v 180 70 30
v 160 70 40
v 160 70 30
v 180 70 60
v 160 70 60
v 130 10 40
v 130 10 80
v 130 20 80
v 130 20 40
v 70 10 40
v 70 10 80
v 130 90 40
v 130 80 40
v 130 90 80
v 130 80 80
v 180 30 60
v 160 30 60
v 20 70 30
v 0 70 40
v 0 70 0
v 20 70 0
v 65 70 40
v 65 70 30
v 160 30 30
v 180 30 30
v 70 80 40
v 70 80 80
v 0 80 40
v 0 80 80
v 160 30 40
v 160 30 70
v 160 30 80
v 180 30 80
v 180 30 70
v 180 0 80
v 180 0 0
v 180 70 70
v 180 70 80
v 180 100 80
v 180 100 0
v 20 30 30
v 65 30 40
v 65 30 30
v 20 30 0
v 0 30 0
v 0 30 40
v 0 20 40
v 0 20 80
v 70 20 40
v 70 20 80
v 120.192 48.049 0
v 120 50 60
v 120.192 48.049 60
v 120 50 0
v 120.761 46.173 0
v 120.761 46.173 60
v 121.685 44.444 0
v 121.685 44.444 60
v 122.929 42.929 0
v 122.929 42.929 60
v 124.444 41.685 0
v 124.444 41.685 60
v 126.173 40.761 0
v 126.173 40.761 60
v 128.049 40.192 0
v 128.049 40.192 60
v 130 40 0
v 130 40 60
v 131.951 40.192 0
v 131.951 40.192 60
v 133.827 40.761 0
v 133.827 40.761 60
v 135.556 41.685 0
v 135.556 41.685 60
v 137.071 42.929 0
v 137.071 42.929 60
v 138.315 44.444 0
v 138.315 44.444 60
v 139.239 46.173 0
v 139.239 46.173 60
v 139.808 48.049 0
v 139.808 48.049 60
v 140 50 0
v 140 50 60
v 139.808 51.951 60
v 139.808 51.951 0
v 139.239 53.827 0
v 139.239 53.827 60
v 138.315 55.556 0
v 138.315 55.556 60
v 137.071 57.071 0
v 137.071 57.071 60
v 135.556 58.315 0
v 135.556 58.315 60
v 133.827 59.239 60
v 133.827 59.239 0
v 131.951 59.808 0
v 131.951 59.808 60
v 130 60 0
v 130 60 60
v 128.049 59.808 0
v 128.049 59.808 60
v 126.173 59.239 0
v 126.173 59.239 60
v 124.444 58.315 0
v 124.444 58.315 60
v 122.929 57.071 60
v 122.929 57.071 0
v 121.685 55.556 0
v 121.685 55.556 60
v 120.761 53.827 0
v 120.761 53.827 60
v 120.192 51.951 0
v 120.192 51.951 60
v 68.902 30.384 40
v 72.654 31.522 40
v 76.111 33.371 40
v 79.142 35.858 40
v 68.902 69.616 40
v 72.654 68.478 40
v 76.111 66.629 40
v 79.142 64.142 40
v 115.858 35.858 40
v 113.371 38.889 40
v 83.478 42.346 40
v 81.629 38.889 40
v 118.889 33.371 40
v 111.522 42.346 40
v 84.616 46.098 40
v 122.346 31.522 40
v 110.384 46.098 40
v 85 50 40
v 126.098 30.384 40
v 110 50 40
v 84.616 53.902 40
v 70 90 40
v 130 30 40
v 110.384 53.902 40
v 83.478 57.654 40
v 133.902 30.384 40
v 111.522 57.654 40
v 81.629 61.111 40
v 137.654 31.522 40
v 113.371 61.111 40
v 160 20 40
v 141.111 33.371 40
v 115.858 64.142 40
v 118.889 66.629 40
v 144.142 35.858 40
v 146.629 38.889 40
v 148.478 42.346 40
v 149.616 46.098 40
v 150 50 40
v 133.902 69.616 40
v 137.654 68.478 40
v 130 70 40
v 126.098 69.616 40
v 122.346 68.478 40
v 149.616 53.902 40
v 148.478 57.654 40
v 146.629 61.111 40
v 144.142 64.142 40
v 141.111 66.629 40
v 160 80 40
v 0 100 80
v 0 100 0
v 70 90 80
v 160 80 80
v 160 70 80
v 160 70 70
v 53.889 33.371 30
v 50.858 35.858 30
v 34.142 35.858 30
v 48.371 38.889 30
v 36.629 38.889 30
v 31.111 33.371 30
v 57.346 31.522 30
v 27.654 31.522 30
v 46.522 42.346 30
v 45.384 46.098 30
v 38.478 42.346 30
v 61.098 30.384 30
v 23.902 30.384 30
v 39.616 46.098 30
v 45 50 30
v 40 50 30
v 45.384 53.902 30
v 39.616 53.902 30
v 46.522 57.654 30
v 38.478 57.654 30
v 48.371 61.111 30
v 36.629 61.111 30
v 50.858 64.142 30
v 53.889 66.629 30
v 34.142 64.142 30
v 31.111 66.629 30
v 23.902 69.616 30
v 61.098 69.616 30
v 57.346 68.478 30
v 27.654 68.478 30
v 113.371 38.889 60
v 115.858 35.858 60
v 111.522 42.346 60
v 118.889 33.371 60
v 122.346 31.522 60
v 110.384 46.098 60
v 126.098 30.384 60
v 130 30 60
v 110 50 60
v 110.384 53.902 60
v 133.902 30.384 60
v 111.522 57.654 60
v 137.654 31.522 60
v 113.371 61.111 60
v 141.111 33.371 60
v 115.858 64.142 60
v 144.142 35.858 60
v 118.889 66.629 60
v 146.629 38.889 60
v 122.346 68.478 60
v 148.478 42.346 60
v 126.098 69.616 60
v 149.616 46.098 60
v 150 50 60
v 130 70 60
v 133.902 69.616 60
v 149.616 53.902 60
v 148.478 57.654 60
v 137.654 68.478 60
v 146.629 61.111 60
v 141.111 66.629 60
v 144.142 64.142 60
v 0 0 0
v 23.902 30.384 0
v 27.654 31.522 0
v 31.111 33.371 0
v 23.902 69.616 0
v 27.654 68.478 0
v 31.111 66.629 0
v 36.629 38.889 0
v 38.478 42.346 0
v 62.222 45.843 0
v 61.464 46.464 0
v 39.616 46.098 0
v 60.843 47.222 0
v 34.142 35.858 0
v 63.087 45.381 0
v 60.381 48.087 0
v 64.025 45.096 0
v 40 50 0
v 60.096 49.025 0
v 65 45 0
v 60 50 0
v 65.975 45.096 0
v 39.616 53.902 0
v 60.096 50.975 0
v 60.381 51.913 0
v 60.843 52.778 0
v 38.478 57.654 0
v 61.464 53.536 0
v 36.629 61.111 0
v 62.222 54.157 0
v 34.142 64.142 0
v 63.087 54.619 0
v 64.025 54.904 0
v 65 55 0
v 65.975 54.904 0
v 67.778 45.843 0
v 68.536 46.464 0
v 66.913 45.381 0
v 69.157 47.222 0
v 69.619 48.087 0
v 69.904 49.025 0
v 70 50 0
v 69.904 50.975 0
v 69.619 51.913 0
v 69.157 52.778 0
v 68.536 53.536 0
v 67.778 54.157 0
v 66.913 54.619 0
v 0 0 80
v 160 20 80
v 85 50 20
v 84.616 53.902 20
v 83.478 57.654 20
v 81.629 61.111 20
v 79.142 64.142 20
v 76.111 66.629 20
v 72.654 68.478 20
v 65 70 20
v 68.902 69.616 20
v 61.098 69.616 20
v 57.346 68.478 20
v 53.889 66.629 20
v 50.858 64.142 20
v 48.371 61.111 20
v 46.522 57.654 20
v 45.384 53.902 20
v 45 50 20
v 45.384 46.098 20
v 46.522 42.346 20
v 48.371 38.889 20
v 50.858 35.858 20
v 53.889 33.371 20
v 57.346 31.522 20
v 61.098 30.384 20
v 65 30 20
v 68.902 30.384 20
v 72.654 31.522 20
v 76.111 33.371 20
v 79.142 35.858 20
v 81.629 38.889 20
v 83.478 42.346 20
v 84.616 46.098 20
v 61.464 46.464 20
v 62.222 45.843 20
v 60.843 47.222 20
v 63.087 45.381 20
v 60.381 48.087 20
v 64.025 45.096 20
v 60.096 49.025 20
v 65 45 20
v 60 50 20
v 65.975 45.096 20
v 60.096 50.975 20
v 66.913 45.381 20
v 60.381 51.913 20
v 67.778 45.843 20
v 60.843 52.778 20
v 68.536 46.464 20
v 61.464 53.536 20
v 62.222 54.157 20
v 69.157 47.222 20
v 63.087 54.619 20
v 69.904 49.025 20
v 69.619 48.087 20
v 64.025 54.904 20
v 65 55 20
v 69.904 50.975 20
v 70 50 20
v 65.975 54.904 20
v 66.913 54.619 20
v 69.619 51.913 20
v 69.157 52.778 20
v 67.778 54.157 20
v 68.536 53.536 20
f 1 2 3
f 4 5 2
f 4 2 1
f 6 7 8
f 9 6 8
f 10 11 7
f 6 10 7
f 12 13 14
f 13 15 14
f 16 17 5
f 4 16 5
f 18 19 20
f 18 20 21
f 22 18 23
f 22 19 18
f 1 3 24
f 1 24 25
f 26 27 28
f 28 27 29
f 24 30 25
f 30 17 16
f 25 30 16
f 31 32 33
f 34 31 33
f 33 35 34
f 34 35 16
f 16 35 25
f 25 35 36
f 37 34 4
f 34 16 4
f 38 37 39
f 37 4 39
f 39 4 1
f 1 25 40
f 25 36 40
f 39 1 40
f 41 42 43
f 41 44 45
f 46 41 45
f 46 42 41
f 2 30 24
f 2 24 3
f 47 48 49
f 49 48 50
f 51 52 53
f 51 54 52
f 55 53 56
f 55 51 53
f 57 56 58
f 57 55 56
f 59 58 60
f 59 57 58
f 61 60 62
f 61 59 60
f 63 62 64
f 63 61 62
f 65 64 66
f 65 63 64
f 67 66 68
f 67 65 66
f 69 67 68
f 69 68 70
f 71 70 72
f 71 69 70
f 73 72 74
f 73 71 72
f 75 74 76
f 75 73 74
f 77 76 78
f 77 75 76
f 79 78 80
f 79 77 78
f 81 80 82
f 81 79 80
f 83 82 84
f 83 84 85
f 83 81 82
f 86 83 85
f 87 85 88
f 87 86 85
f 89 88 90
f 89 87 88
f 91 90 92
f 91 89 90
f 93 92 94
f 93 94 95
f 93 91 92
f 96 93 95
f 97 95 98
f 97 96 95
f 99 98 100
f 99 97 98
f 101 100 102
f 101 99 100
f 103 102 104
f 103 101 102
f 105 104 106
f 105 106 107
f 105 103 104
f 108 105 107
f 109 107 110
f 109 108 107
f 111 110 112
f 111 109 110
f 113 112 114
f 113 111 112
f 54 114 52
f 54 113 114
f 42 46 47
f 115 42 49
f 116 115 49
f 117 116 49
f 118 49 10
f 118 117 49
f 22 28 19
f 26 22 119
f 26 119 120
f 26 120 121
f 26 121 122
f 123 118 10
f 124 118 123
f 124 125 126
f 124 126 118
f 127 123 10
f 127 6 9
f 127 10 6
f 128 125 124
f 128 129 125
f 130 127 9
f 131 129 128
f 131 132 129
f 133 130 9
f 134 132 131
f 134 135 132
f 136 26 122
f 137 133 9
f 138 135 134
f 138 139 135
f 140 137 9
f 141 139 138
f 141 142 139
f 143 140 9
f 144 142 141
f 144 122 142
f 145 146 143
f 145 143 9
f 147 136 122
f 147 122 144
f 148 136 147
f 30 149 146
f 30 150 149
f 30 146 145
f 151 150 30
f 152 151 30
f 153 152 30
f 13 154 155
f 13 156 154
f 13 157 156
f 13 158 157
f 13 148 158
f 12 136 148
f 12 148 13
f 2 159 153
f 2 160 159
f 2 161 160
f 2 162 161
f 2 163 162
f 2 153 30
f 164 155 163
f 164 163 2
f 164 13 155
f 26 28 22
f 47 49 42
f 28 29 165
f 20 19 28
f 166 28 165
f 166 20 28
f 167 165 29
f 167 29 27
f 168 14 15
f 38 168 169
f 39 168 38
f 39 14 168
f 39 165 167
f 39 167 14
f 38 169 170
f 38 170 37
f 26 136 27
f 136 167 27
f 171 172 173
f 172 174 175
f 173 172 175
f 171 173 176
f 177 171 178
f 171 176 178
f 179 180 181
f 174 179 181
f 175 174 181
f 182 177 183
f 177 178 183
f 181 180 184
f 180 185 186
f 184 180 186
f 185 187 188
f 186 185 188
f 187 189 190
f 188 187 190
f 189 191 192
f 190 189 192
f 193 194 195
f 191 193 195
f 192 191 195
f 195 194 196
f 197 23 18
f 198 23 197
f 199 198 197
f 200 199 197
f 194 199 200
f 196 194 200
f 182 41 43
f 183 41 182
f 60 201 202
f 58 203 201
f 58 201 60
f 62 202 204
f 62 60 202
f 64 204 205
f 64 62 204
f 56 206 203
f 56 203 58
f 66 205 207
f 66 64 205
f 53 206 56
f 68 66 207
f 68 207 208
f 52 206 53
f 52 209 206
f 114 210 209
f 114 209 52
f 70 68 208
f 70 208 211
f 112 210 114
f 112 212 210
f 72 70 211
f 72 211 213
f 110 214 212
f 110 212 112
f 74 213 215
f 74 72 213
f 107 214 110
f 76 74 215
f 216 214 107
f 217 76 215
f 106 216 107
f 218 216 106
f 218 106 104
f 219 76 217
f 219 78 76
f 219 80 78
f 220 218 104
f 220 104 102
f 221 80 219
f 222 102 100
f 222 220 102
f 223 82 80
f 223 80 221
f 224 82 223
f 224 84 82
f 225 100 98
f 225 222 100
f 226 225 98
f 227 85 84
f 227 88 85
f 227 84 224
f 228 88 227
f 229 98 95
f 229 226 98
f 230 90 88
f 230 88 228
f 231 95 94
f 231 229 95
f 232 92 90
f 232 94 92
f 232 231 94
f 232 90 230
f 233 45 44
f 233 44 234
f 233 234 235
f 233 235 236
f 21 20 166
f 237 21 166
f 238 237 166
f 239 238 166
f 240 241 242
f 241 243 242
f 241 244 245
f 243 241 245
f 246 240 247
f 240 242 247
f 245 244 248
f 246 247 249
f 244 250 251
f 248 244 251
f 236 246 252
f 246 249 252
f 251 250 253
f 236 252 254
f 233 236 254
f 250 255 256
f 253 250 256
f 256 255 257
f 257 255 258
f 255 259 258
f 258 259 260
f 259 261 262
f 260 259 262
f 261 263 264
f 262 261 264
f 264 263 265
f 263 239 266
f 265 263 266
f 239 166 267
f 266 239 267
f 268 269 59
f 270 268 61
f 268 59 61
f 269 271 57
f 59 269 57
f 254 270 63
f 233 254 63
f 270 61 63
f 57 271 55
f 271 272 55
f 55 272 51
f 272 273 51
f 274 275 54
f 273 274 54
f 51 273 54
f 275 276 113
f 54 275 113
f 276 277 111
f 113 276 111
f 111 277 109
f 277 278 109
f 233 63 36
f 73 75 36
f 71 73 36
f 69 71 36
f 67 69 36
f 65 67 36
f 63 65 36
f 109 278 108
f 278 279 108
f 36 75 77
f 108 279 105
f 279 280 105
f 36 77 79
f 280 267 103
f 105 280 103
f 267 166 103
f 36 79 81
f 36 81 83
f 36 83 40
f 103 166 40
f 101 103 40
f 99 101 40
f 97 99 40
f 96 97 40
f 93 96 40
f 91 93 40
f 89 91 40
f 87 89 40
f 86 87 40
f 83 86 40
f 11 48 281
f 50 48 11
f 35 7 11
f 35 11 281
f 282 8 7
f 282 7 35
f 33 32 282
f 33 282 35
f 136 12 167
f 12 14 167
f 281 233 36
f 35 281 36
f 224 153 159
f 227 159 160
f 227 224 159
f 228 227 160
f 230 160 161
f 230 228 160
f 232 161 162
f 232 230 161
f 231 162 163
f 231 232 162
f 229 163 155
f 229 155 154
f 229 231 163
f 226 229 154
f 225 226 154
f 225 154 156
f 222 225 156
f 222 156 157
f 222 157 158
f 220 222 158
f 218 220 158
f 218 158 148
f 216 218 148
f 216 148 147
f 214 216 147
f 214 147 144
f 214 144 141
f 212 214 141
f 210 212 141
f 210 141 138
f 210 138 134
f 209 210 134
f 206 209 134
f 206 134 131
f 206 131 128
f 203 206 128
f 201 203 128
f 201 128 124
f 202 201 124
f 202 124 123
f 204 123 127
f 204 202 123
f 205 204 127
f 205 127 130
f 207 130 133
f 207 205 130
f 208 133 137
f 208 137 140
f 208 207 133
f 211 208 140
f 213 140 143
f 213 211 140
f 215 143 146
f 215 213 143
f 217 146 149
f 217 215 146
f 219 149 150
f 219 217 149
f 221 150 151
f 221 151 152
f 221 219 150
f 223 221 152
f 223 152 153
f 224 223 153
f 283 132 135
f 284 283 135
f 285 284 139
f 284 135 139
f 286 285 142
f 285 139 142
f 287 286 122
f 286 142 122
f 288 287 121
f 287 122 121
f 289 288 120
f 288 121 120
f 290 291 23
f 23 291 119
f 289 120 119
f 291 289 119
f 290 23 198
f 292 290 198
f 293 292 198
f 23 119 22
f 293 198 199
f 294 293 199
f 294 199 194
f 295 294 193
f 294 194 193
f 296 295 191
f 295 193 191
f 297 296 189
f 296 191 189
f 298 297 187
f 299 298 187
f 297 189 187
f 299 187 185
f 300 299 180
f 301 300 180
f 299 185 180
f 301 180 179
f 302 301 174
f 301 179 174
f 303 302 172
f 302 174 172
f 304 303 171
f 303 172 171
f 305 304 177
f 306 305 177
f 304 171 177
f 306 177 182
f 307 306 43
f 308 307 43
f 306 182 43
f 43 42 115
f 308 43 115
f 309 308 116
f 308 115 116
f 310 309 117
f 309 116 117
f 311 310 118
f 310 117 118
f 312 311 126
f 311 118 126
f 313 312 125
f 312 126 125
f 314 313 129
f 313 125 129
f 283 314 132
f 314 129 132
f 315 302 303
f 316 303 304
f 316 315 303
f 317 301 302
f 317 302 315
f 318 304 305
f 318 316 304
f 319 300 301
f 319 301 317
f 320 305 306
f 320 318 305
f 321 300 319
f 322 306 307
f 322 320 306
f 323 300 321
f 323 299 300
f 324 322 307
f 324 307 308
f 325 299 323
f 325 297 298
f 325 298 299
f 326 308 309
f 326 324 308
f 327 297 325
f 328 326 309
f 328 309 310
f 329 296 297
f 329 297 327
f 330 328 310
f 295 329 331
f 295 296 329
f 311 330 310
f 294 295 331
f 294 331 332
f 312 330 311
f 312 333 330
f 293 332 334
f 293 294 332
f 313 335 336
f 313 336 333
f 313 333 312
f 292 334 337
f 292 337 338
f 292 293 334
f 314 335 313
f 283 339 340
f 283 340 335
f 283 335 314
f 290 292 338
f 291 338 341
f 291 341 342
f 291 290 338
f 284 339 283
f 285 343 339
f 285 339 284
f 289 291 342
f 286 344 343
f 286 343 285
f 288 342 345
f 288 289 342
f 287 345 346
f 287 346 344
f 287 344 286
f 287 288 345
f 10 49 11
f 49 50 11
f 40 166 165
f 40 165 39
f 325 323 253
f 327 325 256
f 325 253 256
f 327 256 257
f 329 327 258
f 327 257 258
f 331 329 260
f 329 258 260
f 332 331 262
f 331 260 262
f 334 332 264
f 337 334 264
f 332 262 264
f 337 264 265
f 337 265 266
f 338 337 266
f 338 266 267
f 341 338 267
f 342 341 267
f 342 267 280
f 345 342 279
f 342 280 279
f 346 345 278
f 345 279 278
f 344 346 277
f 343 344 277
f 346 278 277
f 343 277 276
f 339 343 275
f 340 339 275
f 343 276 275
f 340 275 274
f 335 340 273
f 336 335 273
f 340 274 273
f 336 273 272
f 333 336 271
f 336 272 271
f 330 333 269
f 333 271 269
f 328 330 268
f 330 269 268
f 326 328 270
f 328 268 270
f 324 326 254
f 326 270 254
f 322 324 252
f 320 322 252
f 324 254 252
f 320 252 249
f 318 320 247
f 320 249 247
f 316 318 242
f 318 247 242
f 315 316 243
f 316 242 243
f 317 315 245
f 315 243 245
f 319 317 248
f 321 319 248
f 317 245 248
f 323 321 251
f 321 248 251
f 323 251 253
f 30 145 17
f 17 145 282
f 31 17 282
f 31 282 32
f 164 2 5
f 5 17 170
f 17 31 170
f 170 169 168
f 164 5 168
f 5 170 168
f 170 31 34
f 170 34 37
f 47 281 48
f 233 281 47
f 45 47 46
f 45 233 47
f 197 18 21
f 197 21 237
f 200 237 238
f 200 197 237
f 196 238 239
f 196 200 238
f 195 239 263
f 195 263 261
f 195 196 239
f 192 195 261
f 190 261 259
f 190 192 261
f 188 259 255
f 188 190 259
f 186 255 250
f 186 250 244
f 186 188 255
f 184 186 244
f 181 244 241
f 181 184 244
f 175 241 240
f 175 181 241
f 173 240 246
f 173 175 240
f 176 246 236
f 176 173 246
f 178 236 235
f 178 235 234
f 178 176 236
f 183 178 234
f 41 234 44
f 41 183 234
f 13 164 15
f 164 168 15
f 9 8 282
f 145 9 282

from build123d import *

# Parameters (mm, degrees)
SKETCH1_W           = 180
SKETCH1_H           = 100
BOSS_EXTRUDE1_DEPTH = 80
CUT_EXTRUDE1_DEPTH  = 80
SKETCH3_R           = 5
CUT_EXTRUDE2_DEPTH  = 20
SKETCH4_R           = 10
CUT_EXTRUDE3_DEPTH  = 60
SKETCH5_R           = 20
CUT_EXTRUDE4_DEPTH  = 60
SKETCH6_R           = 20
CUT_EXTRUDE5_DEPTH  = 50
CUT_EXTRUDE6_DEPTH  = 50
SKETCH8_W           = 10
SKETCH8_H           = 40
CUT_EXTRUDE7_DEPTH  = 207
CUT_EXTRUDE8_DEPTH  = 10
CUT_EXTRUDE9_DEPTH  = 10
SKETCH11_W          = 20
SKETCH11_H          = 40
CUT_EXTRUDE10_DEPTH = 30
SKETCH12_R          = 20
SKETCH12_R_2        = 10
BOSS_EXTRUDE3_DEPTH = 30
SKETCH13_R          = 20
CUT_EXTRUDE11_DEPTH = 30
SKETCH14_W          = 20
SKETCH14_H          = 40
CUT_EXTRUDE12_DEPTH = 10
SKETCH15_W          = 10
SKETCH15_H          = 40
BOSS_EXTRUDE5_DEPTH = 20


with BuildPart() as part:
    # Sketch1 → Boss-Extrude1 (new body)
    with BuildSketch(Plane.XY):
        with Locations((90, 50)):
            Rectangle(SKETCH1_W, SKETCH1_H)
    extrude(amount=BOSS_EXTRUDE1_DEPTH)

    # Sketch2 → Cut-Extrude1 (cut)
    with BuildSketch(Plane.XY.offset(80)):
        with BuildLine():
            Line((0, 70), (20, 70))
            ThreePointArc((20, 70), (40, 50), (20, 30))
            Line((20, 30), (0, 30))
            Line((0, 30), (0, 70))
        make_face()
    extrude(amount=-CUT_EXTRUDE1_DEPTH, mode=Mode.SUBTRACT)

    # Sketch3 → Cut-Extrude2 (cut)
    with BuildSketch(Plane(origin=(0, 0, 0), x_dir=(-1, 0, 0), z_dir=(0, 0, -1))):
        with Locations((-65, 50)):
            Circle(SKETCH3_R)
    extrude(amount=-CUT_EXTRUDE2_DEPTH, mode=Mode.SUBTRACT)

    # Sketch4 → Cut-Extrude3 (cut)
    with BuildSketch(Plane(origin=(0, 0, 0), x_dir=(-1, 0, 0), z_dir=(0, 0, -1))):
        with Locations((-130, 50)):
            Circle(SKETCH4_R)
    extrude(amount=-CUT_EXTRUDE3_DEPTH, mode=Mode.SUBTRACT)

    # Sketch5 → Cut-Extrude4 (cut)
    with BuildSketch(Plane.XY.offset(80)):
        with Locations((65, 50)):
            Circle(SKETCH5_R)
    extrude(amount=-CUT_EXTRUDE4_DEPTH, mode=Mode.SUBTRACT)

    # Sketch6 → Cut-Extrude5 (cut)
    with BuildSketch(Plane.XY.offset(80)):
        with Locations((130, 50)):
            Circle(SKETCH6_R)
    extrude(amount=-CUT_EXTRUDE5_DEPTH, mode=Mode.SUBTRACT)

    # Sketch7 → Cut-Extrude6 (cut)
    with BuildSketch(Plane.XY.offset(80)):
        with BuildLine():
            Line((20, 70), (65, 70))
            ThreePointArc((65, 70), (45, 50), (65, 30))
            Line((65, 30), (20, 30))
            ThreePointArc((20, 30), (40, 50), (20, 70))
        make_face()
    extrude(amount=-CUT_EXTRUDE6_DEPTH, mode=Mode.SUBTRACT)

    # Sketch8 → Cut-Extrude7 (cut)
    with BuildSketch(Plane(origin=(180, 0, 0), x_dir=(0, 0, -1), z_dir=(1, 0, 0))):
        with Locations((-75, 50)):
            Rectangle(SKETCH8_W, SKETCH8_H)
    extrude(amount=-CUT_EXTRUDE7_DEPTH, mode=Mode.SUBTRACT)

    # Sketch9 → Cut-Extrude8 (cut)
    with BuildSketch(Plane.XY.offset(80)):
        Polygon((0, 70), (160, 70), (160, 80), (130, 80), (130, 90), (70, 90), (70, 80), (0, 80), align=None)
    extrude(amount=-CUT_EXTRUDE8_DEPTH, mode=Mode.SUBTRACT)

    # Sketch10 → Cut-Extrude9 (cut)
    with BuildSketch(Plane.XY.offset(80)):
        Polygon((160, 20), (160, 30), (0, 30), (0, 20), (70, 20), (70, 10), (130, 10), (130, 20), align=None)
    extrude(amount=-CUT_EXTRUDE9_DEPTH, mode=Mode.SUBTRACT)

    # Sketch11 → Cut-Extrude10 (cut)
    with BuildSketch(Plane.XY.offset(70)):
        with Locations((170, 50)):
            Rectangle(SKETCH11_W, SKETCH11_H)
    extrude(amount=-CUT_EXTRUDE10_DEPTH, mode=Mode.SUBTRACT)

    # Sketch12 → Boss-Extrude3 (add)
    with BuildSketch(Plane.XY.offset(30)):
        with Locations((130, 50)):
            Circle(SKETCH12_R)
        with Locations(Location((130, 50, 0), (0, 0, 180))):
            Circle(SKETCH12_R_2, mode=Mode.SUBTRACT)
    extrude(amount=BOSS_EXTRUDE3_DEPTH)

    # Sketch13 → Cut-Extrude11 (cut)
    with BuildSketch(Plane.XY.offset(70)):
        with BuildLine():
            Line((130, 20), (160, 20))
            Line((160, 20), (160, 30))
            Line((160, 30), (160, 70))
            Line((160, 70), (160, 80))
            Line((160, 80), (130, 80))
            Line((130, 80), (130, 90))
            Line((130, 90), (70, 90))
            Line((70, 90), (70, 80))
            Line((70, 80), (0, 80))
            Line((0, 80), (0, 70))
            Line((0, 70), (65, 70))
            ThreePointArc((65, 70), (85, 50), (65, 30))
            Line((65, 30), (0, 30))
            Line((0, 30), (0, 20))
            Line((0, 20), (70, 20))
            Line((70, 20), (70, 10))
            Line((70, 10), (130, 10))
            Line((130, 10), (130, 20))
        make_face()
        with Locations((130, 50)):
            Circle(SKETCH13_R, mode=Mode.SUBTRACT)
    extrude(amount=-CUT_EXTRUDE11_DEPTH, mode=Mode.SUBTRACT)

    # Sketch14 → Cut-Extrude12 (cut)
    with BuildSketch(Plane.XY.offset(40)):
        with Locations((170, 50)):
            Rectangle(SKETCH14_W, SKETCH14_H)
    extrude(amount=-CUT_EXTRUDE12_DEPTH, mode=Mode.SUBTRACT)

    # Sketch15 → Boss-Extrude5 (add)
    with BuildSketch(Plane.ZY.offset(-160)):
        with Locations((65, 50)):
            Rectangle(SKETCH15_W, SKETCH15_H)
    extrude(amount=-BOSS_EXTRUDE5_DEPTH)


solid = part.part
